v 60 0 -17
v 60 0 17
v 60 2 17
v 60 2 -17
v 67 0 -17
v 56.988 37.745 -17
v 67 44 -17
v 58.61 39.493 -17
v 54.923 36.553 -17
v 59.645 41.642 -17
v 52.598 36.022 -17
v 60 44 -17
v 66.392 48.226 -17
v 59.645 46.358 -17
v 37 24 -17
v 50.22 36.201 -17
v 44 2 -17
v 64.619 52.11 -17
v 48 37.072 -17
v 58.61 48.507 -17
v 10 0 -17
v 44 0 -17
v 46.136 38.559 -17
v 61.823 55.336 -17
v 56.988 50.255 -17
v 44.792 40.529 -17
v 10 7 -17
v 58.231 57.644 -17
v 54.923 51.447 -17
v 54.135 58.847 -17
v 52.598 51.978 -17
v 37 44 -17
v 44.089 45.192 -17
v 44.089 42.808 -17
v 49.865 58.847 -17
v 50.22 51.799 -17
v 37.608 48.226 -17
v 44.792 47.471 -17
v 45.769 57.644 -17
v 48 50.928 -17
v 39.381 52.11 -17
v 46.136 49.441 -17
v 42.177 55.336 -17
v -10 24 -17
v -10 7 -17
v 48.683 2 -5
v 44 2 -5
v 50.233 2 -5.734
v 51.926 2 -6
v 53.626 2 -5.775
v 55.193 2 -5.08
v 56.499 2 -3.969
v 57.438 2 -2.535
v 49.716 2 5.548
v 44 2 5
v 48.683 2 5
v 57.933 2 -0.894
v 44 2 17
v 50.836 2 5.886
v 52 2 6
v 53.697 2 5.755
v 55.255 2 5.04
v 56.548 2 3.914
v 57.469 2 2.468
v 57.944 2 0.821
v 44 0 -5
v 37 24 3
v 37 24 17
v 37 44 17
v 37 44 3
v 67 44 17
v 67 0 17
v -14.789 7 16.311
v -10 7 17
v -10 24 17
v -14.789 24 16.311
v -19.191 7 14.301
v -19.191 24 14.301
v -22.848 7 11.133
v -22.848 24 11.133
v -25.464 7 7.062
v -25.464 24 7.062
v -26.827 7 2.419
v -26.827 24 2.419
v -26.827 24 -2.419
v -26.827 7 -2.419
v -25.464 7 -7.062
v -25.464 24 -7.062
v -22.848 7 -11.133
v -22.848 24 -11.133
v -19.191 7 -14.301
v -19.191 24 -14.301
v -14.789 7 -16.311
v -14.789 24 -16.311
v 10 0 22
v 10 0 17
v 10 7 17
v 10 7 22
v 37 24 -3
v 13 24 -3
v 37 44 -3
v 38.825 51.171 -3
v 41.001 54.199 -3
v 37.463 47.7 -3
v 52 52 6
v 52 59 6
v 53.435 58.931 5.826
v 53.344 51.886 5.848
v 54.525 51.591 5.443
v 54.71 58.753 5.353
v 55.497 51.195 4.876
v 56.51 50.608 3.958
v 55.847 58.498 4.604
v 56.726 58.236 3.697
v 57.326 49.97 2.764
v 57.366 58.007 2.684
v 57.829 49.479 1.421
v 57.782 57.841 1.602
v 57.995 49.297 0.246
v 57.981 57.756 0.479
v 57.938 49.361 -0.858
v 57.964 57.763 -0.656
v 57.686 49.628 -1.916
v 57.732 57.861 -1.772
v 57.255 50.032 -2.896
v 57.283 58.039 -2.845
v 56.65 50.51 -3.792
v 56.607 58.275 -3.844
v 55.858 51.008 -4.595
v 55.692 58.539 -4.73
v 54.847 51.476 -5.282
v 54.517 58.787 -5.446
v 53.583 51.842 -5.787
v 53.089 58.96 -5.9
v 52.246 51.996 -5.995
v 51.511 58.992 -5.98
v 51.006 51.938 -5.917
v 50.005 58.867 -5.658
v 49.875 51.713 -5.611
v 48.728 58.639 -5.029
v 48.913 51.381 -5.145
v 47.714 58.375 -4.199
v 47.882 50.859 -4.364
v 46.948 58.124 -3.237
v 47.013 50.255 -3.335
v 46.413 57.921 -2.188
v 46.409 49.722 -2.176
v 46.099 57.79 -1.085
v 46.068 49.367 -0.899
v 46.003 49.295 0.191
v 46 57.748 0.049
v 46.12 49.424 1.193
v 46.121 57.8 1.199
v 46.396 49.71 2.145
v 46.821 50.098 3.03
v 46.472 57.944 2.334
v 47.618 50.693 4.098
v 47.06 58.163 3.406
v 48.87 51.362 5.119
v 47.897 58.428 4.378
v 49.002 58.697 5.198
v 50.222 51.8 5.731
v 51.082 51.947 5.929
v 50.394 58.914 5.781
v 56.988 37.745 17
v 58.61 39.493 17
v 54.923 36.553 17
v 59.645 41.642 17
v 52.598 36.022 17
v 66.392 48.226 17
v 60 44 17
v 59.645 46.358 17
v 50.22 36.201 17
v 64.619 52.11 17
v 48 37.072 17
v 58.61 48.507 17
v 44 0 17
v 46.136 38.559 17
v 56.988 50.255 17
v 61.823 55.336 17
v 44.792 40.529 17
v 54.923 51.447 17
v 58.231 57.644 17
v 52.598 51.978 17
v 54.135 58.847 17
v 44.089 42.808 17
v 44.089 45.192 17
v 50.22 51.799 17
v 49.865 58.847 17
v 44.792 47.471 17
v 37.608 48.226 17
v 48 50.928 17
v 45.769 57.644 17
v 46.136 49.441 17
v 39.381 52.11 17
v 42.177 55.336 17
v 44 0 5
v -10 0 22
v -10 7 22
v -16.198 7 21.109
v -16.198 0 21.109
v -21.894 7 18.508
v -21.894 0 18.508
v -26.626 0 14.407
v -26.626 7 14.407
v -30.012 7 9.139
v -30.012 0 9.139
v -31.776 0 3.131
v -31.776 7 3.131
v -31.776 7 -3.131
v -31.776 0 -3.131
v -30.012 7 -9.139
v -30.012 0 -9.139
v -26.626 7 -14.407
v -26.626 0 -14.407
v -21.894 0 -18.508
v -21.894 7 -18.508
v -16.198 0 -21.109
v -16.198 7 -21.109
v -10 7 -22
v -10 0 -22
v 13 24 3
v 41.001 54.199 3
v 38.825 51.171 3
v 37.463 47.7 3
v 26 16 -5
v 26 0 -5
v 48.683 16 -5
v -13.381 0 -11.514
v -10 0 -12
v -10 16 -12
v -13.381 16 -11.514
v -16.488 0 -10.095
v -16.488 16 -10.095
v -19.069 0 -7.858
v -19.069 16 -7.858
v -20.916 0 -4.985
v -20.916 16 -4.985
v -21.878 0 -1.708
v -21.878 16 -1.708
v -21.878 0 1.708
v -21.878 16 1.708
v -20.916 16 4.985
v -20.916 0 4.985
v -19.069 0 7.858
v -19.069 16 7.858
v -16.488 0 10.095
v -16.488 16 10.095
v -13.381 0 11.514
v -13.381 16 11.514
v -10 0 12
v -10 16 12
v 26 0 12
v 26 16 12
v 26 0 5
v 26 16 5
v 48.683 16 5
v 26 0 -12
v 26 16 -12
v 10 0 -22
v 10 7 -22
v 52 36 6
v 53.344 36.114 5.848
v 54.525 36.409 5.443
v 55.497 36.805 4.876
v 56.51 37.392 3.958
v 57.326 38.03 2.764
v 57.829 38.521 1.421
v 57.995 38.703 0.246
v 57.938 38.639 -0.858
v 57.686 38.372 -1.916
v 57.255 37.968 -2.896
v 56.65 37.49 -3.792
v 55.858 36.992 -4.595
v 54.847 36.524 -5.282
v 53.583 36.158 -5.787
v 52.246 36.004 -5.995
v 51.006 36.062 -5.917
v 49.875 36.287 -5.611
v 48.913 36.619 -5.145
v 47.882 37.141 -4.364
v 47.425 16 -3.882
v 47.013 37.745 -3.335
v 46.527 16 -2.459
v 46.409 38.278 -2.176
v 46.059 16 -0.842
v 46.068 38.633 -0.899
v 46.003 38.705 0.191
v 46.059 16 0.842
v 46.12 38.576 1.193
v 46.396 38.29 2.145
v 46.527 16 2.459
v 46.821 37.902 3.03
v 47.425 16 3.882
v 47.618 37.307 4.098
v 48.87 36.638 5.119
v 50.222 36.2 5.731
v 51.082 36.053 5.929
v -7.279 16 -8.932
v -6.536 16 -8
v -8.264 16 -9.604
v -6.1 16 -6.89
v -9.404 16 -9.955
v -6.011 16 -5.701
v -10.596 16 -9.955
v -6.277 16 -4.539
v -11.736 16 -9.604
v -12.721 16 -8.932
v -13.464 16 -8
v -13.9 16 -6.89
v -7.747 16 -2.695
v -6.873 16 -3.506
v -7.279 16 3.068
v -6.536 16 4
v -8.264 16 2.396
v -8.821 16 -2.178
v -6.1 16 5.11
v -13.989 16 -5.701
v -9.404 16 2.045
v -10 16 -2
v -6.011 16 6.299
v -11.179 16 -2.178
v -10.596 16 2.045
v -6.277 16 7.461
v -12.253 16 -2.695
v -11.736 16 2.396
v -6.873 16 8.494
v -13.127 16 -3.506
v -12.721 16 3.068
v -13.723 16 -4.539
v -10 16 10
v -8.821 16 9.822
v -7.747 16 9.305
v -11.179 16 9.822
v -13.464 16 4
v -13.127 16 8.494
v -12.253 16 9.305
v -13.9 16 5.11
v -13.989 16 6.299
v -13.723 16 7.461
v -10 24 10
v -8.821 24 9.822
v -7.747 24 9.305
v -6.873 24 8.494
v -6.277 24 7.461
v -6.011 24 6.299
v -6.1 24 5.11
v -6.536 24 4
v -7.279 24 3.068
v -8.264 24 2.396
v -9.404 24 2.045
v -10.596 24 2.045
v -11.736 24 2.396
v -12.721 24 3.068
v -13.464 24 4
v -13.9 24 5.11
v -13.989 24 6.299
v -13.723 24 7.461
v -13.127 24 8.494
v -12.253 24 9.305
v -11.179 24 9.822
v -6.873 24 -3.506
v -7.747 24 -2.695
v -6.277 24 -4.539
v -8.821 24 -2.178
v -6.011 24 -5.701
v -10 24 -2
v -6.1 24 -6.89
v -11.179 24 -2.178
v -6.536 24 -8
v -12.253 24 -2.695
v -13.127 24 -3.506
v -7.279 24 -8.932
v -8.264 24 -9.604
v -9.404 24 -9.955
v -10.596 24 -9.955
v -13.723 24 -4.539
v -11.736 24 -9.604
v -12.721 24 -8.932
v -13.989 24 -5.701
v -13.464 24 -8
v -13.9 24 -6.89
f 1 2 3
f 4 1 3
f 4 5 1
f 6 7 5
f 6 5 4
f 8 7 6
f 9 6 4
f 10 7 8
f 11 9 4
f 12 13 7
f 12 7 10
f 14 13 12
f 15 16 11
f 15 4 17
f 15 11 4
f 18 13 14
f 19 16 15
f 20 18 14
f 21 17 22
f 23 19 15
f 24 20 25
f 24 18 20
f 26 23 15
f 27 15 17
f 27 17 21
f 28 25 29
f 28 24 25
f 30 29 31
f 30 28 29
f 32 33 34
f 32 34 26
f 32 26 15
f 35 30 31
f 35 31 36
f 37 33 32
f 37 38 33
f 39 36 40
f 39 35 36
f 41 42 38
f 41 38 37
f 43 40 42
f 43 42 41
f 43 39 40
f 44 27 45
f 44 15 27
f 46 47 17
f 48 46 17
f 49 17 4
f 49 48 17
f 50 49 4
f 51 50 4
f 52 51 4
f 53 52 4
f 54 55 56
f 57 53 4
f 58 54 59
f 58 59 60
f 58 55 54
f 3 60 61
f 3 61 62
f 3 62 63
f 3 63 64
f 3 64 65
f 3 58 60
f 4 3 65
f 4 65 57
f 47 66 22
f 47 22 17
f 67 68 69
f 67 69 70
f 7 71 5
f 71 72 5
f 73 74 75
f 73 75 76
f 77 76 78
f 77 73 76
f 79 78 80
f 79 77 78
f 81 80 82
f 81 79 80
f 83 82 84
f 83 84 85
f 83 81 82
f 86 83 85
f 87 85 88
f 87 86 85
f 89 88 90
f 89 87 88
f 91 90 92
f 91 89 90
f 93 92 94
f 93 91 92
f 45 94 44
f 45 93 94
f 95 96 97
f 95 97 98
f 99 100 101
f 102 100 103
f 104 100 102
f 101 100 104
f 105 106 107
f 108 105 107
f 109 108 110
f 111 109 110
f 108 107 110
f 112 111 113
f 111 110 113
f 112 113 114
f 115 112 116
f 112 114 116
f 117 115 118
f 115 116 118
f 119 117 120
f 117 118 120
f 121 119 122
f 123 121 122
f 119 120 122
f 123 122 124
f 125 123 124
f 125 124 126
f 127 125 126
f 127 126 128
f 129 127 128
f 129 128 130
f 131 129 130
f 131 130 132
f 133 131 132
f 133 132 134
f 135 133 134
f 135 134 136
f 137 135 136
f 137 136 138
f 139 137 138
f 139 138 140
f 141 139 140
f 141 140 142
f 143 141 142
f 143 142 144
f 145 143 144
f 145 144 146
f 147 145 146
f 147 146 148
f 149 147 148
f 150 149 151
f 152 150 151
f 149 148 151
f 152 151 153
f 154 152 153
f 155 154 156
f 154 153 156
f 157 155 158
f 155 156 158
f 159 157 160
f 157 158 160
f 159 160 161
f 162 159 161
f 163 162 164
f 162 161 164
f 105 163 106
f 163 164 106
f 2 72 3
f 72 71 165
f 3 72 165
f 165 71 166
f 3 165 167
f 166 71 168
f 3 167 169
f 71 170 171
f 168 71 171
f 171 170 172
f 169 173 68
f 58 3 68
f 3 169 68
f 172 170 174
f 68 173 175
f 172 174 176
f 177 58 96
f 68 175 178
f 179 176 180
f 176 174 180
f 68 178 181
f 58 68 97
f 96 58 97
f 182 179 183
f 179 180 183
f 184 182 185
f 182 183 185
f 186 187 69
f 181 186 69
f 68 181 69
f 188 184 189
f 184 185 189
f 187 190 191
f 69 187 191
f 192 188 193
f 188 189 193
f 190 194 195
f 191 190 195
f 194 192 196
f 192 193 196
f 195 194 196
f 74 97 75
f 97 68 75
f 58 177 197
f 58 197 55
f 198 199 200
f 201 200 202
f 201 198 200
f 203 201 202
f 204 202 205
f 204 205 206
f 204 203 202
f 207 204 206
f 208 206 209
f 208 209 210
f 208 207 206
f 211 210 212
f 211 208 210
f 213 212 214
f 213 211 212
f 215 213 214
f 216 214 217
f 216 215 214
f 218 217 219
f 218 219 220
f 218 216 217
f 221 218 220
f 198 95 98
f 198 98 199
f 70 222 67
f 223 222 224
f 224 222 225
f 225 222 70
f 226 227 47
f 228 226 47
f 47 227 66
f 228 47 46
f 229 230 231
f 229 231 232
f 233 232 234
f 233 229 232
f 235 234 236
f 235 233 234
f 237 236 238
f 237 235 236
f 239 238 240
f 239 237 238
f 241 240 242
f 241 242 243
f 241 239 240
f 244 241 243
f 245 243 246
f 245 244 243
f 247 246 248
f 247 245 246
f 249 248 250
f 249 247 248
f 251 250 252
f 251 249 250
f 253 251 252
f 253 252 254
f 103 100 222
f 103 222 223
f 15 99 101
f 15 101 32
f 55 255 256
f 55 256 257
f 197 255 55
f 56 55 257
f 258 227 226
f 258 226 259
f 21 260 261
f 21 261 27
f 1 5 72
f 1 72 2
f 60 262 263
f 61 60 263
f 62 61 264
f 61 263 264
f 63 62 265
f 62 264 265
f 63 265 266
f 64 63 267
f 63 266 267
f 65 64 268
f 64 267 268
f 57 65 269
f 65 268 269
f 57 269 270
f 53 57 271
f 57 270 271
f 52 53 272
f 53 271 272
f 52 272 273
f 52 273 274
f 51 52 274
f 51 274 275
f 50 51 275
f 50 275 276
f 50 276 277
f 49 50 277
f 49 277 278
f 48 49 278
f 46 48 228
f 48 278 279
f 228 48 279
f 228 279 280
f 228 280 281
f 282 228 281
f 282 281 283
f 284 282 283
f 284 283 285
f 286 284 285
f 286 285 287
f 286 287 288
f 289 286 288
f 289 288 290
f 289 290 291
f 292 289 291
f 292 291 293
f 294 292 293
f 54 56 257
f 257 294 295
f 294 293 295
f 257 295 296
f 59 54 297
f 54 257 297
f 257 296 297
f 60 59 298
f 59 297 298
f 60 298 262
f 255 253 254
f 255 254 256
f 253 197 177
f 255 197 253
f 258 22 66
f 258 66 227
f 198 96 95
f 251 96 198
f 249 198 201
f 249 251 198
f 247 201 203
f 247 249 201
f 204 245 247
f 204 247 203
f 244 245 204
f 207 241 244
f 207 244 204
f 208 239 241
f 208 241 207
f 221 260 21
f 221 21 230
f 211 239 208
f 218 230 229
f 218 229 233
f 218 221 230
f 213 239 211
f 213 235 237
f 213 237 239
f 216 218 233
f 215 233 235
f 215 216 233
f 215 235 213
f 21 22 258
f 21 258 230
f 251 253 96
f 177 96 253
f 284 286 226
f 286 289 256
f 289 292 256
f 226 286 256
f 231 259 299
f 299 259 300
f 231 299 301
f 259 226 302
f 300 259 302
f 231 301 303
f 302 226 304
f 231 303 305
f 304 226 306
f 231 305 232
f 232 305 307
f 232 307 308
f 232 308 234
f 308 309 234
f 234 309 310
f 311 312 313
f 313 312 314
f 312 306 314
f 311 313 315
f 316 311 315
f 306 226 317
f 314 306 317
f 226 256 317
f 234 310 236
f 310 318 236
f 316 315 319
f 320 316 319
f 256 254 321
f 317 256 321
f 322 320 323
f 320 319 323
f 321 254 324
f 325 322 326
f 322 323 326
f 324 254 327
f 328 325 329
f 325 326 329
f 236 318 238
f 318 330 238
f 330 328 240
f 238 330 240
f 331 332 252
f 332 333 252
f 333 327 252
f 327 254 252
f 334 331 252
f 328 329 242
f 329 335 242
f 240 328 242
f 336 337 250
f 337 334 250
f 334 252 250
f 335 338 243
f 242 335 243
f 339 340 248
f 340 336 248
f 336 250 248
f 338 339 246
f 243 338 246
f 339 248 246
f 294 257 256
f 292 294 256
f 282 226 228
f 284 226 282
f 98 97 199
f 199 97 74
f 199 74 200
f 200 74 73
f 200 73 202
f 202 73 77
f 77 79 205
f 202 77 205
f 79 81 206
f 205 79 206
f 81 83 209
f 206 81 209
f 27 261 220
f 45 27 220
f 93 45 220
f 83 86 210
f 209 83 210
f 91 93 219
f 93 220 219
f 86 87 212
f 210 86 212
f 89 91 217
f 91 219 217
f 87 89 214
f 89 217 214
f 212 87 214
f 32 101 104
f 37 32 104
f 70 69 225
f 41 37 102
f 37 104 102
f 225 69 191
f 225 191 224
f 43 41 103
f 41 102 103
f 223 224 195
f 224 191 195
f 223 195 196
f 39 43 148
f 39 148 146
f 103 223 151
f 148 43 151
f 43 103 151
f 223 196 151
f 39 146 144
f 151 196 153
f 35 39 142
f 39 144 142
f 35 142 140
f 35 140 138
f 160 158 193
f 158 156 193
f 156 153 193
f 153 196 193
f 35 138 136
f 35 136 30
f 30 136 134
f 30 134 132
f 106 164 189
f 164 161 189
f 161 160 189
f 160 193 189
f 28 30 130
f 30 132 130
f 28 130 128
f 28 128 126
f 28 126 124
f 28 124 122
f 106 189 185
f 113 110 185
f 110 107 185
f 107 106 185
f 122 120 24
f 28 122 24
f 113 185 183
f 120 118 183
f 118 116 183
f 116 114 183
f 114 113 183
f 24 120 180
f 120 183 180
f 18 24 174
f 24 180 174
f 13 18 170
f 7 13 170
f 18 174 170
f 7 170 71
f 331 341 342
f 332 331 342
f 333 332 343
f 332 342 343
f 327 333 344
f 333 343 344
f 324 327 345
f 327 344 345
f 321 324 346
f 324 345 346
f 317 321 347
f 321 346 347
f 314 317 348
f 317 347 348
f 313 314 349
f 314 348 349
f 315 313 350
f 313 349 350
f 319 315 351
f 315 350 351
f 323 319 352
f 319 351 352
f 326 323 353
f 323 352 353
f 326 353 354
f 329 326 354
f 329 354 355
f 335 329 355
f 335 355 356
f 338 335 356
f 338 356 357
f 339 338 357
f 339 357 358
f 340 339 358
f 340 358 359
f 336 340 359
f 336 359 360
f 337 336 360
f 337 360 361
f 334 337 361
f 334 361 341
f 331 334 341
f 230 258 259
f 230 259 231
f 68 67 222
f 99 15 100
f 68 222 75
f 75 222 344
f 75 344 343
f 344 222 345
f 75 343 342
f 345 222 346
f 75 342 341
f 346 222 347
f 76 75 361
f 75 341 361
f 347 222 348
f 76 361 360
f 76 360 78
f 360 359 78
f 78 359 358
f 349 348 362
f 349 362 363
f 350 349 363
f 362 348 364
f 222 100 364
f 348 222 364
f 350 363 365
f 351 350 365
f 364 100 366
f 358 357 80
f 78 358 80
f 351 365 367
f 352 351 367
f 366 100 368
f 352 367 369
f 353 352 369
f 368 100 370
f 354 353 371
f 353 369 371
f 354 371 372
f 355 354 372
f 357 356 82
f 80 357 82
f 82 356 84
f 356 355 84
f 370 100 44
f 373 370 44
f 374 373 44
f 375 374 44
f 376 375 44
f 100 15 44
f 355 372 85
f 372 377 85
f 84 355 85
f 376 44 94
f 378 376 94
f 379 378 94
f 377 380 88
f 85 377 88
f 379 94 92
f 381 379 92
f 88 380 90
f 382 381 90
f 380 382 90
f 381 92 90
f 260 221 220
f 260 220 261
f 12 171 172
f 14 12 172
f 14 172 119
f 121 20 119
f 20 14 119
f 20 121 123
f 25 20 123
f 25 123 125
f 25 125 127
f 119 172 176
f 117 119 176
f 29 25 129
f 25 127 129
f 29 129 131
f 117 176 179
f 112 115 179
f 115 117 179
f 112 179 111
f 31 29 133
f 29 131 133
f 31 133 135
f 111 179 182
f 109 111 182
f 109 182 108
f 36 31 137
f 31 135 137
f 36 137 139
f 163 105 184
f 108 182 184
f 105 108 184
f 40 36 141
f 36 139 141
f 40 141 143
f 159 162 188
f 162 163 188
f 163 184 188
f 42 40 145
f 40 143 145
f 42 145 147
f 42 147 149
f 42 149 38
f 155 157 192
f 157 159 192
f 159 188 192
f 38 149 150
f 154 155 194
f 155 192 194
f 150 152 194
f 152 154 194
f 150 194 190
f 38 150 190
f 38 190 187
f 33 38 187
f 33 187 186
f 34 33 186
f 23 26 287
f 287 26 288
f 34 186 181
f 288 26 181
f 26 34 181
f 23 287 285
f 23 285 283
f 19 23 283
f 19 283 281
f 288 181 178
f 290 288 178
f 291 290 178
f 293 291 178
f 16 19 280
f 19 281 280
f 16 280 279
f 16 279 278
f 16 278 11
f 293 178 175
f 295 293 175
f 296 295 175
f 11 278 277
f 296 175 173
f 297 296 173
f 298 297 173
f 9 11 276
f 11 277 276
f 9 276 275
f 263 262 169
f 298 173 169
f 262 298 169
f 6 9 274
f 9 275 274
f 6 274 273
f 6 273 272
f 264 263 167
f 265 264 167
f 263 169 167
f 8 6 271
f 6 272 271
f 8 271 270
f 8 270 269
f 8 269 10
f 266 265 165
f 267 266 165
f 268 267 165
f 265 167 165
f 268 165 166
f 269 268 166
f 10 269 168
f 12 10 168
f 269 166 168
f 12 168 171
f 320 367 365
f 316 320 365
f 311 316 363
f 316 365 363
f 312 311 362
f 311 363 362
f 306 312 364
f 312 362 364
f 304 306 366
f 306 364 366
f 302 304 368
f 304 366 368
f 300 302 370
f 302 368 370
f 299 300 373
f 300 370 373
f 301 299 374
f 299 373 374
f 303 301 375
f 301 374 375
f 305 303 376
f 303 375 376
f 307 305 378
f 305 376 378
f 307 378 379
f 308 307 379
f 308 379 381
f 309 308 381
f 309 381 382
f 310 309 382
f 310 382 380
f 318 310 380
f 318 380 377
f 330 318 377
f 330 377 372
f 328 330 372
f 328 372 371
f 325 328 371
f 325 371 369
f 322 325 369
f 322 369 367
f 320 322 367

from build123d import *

# Parameters (mm, degrees)
EXTRUDE_1_DEPTH      = 7
EXTRUDE_2_DEPTH      = 17
EXTRUDE_2_DEPTH_BACK = 7
CUT_EXTRUDE_1_DEPTH  = 16
CUT_EXTRUDE_2_REACH  = 76.492
SKETCH_5_R           = 4
SKETCH_6_W           = 30
SKETCH_6_H           = 34
EXTRUDE_3_DEPTH      = 20
EXTRUDE_4_DEPTH      = 34
CUT_EXTRUDE_3_REACH  = 99.422
SKETCH_8_R           = 8
RIB_1_REACH          = 93.946
SKETCH_9_WALL_W      = 227.073790214
SKETCH_9_WALL_H      = 6
SKETCH_10_R          = 6
CUT_EXTRUDE_4_DEPTH  = 92.945634825
SKETCH_11_W          = 16
SKETCH_11_H          = 4
CUT_EXTRUDE_5_DEPTH  = 98.421762397
SKETCH_12_W          = 48.790865184
SKETCH_12_H          = 10
CUT_EXTRUDE_8_DEPTH  = 16


with BuildPart() as part:
    # 草图1 → 凸台-拉伸1 (new body)
    with BuildSketch(Plane(origin=(0, 0, 0), x_dir=(1, 0, 0), z_dir=(0, 1, 0))):
        with BuildLine():
            Line((10, -22), (-10, -22))
            ThreePointArc((-10, -22), (-32, 0), (-10, 22))
            Line((-10, 22), (10, 22))
            Line((10, 22), (10, -22))
        make_face()
    extrude(amount=EXTRUDE_1_DEPTH)

    # 草图3 → 凸台-拉伸2 (add, two sides: drawn at the far end of the back side and taken through both)
    with BuildSketch(Plane(origin=(0, 7, 0), x_dir=(1, 0, 0), z_dir=(0, 1, 0)).offset(-EXTRUDE_2_DEPTH_BACK)):
        with BuildLine():
            Line((-10, 17), (66.999998234, 17))
            Line((66.999998234, 17), (66.999998234, -17))
            Line((66.999998234, -17), (-10.000001766, -17))
            ThreePointArc((-10.000001766, -17), (-27, 8.83e-07), (-10, 17))
        make_face()
    extrude(amount=EXTRUDE_2_DEPTH + EXTRUDE_2_DEPTH_BACK)

    # 草图4 → 切除-拉伸1 (cut)
    with BuildSketch(Plane.XZ):
        with BuildLine():
            Line((-10, 12), (26, 12))
            Line((26, 12), (26, -12))
            Line((26, -12), (-10, -12))
            ThreePointArc((-10, -12), (-22, 0), (-10, 12))
        make_face()
    extrude(amount=-CUT_EXTRUDE_1_DEPTH, mode=Mode.SUBTRACT)

    # 草图5 → 切除-拉伸2 (cut, up to next)
    with BuildSketch(Plane(origin=(0, 24, 0), x_dir=(1, 0, 0), z_dir=(0, 1, 0)), mode=Mode.PRIVATE) as cut_extrude_2_sk1:
        with Locations(Location((-10, 6, 0), (0, 0, 270))):
            Circle(SKETCH_5_R)
    cut_extrude_2_tool1 = extrude(cut_extrude_2_sk1.sketch, amount=-CUT_EXTRUDE_2_REACH, mode=Mode.PRIVATE) & part.part
    # 草图5 → 切除-拉伸2 (cut, up to next)
    with BuildSketch(Plane(origin=(0, 24, 0), x_dir=(1, 0, 0), z_dir=(0, 1, 0)), mode=Mode.PRIVATE) as cut_extrude_2_sk2:
        with Locations(Location((-10, -6, 0), (0, 0, 270))):
            Circle(SKETCH_5_R)
    cut_extrude_2_tool2 = extrude(cut_extrude_2_sk2.sketch, amount=-CUT_EXTRUDE_2_REACH, mode=Mode.PRIVATE) & part.part
    add(cut_extrude_2_tool1.solids().sort_by_distance((-10, 24, -6))[0], mode=Mode.SUBTRACT)
    add(cut_extrude_2_tool2.solids().sort_by_distance((-10, 24, 6))[0], mode=Mode.SUBTRACT)

    # 草图6 → 凸台-拉伸3 (add)
    with BuildSketch(Plane(origin=(0, 24, 0), x_dir=(1, 0, 0), z_dir=(0, 1, 0))):
        with Locations((51.999998234, 0)):
            Rectangle(SKETCH_6_W, SKETCH_6_H)
    extrude(amount=EXTRUDE_3_DEPTH)

    # 草图7 → 凸台-拉伸4 (add)
    with BuildSketch(Plane.XY.offset(17)):
        with BuildLine():
            ThreePointArc((36.999998234, 44), (51.999998234, 59), (66.999998234, 44))
            Line((66.999998234, 44), (36.999998234, 44))
        make_face()
    extrude(amount=-EXTRUDE_4_DEPTH)

    # 草图8 → 切除-拉伸3 (cut, up to next)
    with BuildSketch(Plane.XY.offset(17), mode=Mode.PRIVATE) as cut_extrude_3_sk1:
        with Locations((51.999998234, 44)):
            Circle(SKETCH_8_R)
    cut_extrude_3_tool1 = extrude(cut_extrude_3_sk1.sketch, amount=-CUT_EXTRUDE_3_REACH, mode=Mode.PRIVATE) & part.part
    add(cut_extrude_3_tool1.solids().sort_by_distance((51.999998, 44, 17))[0], mode=Mode.SUBTRACT)

    # 草图9 wall → 筋1 (add, up to next)
    with BuildSketch(Plane(origin=(27.00032198, 39.099368696, 0), x_dir=(0.679915826137, 0.733290167238, 0), z_dir=(-0.733290167238, 0.679915826137, 0)), mode=Mode.PRIVATE) as rib_1_sk1:
        Rectangle(SKETCH_9_WALL_W, SKETCH_9_WALL_H)
    rib_1_tool1 = extrude(rib_1_sk1.sketch, amount=-RIB_1_REACH, mode=Mode.PRIVATE) - part.part
    add(rib_1_tool1.solids().sort_by_distance((27.00032198, 39.099368696, 0))[0])

    # 草图10 → 切除-拉伸4 (cut, through all)
    with BuildSketch(Plane(origin=(0, 59, 0), x_dir=(1, 0, 0), z_dir=(0, 1, 0))):
        with Locations(Location((51.999998234, 0, 0), (0, 0, 270))):
            Circle(SKETCH_10_R)
    extrude(amount=-CUT_EXTRUDE_4_DEPTH, mode=Mode.SUBTRACT)

    # 草图11 → 切除-拉伸5 (cut, through all)
    with BuildSketch(Plane.XY.offset(17)):
        with Locations((51.999998234, 0)):
            Rectangle(SKETCH_11_W, SKETCH_11_H)
    extrude(amount=-CUT_EXTRUDE_5_DEPTH, mode=Mode.SUBTRACT)

    # 草图12 → 切除-拉伸8 (cut)
    with BuildSketch(Plane.XZ):
        with Locations((26, 0)):
            Rectangle(SKETCH_12_W, SKETCH_12_H)
    extrude(amount=-CUT_EXTRUDE_8_DEPTH, mode=Mode.SUBTRACT)


solid = part.part
